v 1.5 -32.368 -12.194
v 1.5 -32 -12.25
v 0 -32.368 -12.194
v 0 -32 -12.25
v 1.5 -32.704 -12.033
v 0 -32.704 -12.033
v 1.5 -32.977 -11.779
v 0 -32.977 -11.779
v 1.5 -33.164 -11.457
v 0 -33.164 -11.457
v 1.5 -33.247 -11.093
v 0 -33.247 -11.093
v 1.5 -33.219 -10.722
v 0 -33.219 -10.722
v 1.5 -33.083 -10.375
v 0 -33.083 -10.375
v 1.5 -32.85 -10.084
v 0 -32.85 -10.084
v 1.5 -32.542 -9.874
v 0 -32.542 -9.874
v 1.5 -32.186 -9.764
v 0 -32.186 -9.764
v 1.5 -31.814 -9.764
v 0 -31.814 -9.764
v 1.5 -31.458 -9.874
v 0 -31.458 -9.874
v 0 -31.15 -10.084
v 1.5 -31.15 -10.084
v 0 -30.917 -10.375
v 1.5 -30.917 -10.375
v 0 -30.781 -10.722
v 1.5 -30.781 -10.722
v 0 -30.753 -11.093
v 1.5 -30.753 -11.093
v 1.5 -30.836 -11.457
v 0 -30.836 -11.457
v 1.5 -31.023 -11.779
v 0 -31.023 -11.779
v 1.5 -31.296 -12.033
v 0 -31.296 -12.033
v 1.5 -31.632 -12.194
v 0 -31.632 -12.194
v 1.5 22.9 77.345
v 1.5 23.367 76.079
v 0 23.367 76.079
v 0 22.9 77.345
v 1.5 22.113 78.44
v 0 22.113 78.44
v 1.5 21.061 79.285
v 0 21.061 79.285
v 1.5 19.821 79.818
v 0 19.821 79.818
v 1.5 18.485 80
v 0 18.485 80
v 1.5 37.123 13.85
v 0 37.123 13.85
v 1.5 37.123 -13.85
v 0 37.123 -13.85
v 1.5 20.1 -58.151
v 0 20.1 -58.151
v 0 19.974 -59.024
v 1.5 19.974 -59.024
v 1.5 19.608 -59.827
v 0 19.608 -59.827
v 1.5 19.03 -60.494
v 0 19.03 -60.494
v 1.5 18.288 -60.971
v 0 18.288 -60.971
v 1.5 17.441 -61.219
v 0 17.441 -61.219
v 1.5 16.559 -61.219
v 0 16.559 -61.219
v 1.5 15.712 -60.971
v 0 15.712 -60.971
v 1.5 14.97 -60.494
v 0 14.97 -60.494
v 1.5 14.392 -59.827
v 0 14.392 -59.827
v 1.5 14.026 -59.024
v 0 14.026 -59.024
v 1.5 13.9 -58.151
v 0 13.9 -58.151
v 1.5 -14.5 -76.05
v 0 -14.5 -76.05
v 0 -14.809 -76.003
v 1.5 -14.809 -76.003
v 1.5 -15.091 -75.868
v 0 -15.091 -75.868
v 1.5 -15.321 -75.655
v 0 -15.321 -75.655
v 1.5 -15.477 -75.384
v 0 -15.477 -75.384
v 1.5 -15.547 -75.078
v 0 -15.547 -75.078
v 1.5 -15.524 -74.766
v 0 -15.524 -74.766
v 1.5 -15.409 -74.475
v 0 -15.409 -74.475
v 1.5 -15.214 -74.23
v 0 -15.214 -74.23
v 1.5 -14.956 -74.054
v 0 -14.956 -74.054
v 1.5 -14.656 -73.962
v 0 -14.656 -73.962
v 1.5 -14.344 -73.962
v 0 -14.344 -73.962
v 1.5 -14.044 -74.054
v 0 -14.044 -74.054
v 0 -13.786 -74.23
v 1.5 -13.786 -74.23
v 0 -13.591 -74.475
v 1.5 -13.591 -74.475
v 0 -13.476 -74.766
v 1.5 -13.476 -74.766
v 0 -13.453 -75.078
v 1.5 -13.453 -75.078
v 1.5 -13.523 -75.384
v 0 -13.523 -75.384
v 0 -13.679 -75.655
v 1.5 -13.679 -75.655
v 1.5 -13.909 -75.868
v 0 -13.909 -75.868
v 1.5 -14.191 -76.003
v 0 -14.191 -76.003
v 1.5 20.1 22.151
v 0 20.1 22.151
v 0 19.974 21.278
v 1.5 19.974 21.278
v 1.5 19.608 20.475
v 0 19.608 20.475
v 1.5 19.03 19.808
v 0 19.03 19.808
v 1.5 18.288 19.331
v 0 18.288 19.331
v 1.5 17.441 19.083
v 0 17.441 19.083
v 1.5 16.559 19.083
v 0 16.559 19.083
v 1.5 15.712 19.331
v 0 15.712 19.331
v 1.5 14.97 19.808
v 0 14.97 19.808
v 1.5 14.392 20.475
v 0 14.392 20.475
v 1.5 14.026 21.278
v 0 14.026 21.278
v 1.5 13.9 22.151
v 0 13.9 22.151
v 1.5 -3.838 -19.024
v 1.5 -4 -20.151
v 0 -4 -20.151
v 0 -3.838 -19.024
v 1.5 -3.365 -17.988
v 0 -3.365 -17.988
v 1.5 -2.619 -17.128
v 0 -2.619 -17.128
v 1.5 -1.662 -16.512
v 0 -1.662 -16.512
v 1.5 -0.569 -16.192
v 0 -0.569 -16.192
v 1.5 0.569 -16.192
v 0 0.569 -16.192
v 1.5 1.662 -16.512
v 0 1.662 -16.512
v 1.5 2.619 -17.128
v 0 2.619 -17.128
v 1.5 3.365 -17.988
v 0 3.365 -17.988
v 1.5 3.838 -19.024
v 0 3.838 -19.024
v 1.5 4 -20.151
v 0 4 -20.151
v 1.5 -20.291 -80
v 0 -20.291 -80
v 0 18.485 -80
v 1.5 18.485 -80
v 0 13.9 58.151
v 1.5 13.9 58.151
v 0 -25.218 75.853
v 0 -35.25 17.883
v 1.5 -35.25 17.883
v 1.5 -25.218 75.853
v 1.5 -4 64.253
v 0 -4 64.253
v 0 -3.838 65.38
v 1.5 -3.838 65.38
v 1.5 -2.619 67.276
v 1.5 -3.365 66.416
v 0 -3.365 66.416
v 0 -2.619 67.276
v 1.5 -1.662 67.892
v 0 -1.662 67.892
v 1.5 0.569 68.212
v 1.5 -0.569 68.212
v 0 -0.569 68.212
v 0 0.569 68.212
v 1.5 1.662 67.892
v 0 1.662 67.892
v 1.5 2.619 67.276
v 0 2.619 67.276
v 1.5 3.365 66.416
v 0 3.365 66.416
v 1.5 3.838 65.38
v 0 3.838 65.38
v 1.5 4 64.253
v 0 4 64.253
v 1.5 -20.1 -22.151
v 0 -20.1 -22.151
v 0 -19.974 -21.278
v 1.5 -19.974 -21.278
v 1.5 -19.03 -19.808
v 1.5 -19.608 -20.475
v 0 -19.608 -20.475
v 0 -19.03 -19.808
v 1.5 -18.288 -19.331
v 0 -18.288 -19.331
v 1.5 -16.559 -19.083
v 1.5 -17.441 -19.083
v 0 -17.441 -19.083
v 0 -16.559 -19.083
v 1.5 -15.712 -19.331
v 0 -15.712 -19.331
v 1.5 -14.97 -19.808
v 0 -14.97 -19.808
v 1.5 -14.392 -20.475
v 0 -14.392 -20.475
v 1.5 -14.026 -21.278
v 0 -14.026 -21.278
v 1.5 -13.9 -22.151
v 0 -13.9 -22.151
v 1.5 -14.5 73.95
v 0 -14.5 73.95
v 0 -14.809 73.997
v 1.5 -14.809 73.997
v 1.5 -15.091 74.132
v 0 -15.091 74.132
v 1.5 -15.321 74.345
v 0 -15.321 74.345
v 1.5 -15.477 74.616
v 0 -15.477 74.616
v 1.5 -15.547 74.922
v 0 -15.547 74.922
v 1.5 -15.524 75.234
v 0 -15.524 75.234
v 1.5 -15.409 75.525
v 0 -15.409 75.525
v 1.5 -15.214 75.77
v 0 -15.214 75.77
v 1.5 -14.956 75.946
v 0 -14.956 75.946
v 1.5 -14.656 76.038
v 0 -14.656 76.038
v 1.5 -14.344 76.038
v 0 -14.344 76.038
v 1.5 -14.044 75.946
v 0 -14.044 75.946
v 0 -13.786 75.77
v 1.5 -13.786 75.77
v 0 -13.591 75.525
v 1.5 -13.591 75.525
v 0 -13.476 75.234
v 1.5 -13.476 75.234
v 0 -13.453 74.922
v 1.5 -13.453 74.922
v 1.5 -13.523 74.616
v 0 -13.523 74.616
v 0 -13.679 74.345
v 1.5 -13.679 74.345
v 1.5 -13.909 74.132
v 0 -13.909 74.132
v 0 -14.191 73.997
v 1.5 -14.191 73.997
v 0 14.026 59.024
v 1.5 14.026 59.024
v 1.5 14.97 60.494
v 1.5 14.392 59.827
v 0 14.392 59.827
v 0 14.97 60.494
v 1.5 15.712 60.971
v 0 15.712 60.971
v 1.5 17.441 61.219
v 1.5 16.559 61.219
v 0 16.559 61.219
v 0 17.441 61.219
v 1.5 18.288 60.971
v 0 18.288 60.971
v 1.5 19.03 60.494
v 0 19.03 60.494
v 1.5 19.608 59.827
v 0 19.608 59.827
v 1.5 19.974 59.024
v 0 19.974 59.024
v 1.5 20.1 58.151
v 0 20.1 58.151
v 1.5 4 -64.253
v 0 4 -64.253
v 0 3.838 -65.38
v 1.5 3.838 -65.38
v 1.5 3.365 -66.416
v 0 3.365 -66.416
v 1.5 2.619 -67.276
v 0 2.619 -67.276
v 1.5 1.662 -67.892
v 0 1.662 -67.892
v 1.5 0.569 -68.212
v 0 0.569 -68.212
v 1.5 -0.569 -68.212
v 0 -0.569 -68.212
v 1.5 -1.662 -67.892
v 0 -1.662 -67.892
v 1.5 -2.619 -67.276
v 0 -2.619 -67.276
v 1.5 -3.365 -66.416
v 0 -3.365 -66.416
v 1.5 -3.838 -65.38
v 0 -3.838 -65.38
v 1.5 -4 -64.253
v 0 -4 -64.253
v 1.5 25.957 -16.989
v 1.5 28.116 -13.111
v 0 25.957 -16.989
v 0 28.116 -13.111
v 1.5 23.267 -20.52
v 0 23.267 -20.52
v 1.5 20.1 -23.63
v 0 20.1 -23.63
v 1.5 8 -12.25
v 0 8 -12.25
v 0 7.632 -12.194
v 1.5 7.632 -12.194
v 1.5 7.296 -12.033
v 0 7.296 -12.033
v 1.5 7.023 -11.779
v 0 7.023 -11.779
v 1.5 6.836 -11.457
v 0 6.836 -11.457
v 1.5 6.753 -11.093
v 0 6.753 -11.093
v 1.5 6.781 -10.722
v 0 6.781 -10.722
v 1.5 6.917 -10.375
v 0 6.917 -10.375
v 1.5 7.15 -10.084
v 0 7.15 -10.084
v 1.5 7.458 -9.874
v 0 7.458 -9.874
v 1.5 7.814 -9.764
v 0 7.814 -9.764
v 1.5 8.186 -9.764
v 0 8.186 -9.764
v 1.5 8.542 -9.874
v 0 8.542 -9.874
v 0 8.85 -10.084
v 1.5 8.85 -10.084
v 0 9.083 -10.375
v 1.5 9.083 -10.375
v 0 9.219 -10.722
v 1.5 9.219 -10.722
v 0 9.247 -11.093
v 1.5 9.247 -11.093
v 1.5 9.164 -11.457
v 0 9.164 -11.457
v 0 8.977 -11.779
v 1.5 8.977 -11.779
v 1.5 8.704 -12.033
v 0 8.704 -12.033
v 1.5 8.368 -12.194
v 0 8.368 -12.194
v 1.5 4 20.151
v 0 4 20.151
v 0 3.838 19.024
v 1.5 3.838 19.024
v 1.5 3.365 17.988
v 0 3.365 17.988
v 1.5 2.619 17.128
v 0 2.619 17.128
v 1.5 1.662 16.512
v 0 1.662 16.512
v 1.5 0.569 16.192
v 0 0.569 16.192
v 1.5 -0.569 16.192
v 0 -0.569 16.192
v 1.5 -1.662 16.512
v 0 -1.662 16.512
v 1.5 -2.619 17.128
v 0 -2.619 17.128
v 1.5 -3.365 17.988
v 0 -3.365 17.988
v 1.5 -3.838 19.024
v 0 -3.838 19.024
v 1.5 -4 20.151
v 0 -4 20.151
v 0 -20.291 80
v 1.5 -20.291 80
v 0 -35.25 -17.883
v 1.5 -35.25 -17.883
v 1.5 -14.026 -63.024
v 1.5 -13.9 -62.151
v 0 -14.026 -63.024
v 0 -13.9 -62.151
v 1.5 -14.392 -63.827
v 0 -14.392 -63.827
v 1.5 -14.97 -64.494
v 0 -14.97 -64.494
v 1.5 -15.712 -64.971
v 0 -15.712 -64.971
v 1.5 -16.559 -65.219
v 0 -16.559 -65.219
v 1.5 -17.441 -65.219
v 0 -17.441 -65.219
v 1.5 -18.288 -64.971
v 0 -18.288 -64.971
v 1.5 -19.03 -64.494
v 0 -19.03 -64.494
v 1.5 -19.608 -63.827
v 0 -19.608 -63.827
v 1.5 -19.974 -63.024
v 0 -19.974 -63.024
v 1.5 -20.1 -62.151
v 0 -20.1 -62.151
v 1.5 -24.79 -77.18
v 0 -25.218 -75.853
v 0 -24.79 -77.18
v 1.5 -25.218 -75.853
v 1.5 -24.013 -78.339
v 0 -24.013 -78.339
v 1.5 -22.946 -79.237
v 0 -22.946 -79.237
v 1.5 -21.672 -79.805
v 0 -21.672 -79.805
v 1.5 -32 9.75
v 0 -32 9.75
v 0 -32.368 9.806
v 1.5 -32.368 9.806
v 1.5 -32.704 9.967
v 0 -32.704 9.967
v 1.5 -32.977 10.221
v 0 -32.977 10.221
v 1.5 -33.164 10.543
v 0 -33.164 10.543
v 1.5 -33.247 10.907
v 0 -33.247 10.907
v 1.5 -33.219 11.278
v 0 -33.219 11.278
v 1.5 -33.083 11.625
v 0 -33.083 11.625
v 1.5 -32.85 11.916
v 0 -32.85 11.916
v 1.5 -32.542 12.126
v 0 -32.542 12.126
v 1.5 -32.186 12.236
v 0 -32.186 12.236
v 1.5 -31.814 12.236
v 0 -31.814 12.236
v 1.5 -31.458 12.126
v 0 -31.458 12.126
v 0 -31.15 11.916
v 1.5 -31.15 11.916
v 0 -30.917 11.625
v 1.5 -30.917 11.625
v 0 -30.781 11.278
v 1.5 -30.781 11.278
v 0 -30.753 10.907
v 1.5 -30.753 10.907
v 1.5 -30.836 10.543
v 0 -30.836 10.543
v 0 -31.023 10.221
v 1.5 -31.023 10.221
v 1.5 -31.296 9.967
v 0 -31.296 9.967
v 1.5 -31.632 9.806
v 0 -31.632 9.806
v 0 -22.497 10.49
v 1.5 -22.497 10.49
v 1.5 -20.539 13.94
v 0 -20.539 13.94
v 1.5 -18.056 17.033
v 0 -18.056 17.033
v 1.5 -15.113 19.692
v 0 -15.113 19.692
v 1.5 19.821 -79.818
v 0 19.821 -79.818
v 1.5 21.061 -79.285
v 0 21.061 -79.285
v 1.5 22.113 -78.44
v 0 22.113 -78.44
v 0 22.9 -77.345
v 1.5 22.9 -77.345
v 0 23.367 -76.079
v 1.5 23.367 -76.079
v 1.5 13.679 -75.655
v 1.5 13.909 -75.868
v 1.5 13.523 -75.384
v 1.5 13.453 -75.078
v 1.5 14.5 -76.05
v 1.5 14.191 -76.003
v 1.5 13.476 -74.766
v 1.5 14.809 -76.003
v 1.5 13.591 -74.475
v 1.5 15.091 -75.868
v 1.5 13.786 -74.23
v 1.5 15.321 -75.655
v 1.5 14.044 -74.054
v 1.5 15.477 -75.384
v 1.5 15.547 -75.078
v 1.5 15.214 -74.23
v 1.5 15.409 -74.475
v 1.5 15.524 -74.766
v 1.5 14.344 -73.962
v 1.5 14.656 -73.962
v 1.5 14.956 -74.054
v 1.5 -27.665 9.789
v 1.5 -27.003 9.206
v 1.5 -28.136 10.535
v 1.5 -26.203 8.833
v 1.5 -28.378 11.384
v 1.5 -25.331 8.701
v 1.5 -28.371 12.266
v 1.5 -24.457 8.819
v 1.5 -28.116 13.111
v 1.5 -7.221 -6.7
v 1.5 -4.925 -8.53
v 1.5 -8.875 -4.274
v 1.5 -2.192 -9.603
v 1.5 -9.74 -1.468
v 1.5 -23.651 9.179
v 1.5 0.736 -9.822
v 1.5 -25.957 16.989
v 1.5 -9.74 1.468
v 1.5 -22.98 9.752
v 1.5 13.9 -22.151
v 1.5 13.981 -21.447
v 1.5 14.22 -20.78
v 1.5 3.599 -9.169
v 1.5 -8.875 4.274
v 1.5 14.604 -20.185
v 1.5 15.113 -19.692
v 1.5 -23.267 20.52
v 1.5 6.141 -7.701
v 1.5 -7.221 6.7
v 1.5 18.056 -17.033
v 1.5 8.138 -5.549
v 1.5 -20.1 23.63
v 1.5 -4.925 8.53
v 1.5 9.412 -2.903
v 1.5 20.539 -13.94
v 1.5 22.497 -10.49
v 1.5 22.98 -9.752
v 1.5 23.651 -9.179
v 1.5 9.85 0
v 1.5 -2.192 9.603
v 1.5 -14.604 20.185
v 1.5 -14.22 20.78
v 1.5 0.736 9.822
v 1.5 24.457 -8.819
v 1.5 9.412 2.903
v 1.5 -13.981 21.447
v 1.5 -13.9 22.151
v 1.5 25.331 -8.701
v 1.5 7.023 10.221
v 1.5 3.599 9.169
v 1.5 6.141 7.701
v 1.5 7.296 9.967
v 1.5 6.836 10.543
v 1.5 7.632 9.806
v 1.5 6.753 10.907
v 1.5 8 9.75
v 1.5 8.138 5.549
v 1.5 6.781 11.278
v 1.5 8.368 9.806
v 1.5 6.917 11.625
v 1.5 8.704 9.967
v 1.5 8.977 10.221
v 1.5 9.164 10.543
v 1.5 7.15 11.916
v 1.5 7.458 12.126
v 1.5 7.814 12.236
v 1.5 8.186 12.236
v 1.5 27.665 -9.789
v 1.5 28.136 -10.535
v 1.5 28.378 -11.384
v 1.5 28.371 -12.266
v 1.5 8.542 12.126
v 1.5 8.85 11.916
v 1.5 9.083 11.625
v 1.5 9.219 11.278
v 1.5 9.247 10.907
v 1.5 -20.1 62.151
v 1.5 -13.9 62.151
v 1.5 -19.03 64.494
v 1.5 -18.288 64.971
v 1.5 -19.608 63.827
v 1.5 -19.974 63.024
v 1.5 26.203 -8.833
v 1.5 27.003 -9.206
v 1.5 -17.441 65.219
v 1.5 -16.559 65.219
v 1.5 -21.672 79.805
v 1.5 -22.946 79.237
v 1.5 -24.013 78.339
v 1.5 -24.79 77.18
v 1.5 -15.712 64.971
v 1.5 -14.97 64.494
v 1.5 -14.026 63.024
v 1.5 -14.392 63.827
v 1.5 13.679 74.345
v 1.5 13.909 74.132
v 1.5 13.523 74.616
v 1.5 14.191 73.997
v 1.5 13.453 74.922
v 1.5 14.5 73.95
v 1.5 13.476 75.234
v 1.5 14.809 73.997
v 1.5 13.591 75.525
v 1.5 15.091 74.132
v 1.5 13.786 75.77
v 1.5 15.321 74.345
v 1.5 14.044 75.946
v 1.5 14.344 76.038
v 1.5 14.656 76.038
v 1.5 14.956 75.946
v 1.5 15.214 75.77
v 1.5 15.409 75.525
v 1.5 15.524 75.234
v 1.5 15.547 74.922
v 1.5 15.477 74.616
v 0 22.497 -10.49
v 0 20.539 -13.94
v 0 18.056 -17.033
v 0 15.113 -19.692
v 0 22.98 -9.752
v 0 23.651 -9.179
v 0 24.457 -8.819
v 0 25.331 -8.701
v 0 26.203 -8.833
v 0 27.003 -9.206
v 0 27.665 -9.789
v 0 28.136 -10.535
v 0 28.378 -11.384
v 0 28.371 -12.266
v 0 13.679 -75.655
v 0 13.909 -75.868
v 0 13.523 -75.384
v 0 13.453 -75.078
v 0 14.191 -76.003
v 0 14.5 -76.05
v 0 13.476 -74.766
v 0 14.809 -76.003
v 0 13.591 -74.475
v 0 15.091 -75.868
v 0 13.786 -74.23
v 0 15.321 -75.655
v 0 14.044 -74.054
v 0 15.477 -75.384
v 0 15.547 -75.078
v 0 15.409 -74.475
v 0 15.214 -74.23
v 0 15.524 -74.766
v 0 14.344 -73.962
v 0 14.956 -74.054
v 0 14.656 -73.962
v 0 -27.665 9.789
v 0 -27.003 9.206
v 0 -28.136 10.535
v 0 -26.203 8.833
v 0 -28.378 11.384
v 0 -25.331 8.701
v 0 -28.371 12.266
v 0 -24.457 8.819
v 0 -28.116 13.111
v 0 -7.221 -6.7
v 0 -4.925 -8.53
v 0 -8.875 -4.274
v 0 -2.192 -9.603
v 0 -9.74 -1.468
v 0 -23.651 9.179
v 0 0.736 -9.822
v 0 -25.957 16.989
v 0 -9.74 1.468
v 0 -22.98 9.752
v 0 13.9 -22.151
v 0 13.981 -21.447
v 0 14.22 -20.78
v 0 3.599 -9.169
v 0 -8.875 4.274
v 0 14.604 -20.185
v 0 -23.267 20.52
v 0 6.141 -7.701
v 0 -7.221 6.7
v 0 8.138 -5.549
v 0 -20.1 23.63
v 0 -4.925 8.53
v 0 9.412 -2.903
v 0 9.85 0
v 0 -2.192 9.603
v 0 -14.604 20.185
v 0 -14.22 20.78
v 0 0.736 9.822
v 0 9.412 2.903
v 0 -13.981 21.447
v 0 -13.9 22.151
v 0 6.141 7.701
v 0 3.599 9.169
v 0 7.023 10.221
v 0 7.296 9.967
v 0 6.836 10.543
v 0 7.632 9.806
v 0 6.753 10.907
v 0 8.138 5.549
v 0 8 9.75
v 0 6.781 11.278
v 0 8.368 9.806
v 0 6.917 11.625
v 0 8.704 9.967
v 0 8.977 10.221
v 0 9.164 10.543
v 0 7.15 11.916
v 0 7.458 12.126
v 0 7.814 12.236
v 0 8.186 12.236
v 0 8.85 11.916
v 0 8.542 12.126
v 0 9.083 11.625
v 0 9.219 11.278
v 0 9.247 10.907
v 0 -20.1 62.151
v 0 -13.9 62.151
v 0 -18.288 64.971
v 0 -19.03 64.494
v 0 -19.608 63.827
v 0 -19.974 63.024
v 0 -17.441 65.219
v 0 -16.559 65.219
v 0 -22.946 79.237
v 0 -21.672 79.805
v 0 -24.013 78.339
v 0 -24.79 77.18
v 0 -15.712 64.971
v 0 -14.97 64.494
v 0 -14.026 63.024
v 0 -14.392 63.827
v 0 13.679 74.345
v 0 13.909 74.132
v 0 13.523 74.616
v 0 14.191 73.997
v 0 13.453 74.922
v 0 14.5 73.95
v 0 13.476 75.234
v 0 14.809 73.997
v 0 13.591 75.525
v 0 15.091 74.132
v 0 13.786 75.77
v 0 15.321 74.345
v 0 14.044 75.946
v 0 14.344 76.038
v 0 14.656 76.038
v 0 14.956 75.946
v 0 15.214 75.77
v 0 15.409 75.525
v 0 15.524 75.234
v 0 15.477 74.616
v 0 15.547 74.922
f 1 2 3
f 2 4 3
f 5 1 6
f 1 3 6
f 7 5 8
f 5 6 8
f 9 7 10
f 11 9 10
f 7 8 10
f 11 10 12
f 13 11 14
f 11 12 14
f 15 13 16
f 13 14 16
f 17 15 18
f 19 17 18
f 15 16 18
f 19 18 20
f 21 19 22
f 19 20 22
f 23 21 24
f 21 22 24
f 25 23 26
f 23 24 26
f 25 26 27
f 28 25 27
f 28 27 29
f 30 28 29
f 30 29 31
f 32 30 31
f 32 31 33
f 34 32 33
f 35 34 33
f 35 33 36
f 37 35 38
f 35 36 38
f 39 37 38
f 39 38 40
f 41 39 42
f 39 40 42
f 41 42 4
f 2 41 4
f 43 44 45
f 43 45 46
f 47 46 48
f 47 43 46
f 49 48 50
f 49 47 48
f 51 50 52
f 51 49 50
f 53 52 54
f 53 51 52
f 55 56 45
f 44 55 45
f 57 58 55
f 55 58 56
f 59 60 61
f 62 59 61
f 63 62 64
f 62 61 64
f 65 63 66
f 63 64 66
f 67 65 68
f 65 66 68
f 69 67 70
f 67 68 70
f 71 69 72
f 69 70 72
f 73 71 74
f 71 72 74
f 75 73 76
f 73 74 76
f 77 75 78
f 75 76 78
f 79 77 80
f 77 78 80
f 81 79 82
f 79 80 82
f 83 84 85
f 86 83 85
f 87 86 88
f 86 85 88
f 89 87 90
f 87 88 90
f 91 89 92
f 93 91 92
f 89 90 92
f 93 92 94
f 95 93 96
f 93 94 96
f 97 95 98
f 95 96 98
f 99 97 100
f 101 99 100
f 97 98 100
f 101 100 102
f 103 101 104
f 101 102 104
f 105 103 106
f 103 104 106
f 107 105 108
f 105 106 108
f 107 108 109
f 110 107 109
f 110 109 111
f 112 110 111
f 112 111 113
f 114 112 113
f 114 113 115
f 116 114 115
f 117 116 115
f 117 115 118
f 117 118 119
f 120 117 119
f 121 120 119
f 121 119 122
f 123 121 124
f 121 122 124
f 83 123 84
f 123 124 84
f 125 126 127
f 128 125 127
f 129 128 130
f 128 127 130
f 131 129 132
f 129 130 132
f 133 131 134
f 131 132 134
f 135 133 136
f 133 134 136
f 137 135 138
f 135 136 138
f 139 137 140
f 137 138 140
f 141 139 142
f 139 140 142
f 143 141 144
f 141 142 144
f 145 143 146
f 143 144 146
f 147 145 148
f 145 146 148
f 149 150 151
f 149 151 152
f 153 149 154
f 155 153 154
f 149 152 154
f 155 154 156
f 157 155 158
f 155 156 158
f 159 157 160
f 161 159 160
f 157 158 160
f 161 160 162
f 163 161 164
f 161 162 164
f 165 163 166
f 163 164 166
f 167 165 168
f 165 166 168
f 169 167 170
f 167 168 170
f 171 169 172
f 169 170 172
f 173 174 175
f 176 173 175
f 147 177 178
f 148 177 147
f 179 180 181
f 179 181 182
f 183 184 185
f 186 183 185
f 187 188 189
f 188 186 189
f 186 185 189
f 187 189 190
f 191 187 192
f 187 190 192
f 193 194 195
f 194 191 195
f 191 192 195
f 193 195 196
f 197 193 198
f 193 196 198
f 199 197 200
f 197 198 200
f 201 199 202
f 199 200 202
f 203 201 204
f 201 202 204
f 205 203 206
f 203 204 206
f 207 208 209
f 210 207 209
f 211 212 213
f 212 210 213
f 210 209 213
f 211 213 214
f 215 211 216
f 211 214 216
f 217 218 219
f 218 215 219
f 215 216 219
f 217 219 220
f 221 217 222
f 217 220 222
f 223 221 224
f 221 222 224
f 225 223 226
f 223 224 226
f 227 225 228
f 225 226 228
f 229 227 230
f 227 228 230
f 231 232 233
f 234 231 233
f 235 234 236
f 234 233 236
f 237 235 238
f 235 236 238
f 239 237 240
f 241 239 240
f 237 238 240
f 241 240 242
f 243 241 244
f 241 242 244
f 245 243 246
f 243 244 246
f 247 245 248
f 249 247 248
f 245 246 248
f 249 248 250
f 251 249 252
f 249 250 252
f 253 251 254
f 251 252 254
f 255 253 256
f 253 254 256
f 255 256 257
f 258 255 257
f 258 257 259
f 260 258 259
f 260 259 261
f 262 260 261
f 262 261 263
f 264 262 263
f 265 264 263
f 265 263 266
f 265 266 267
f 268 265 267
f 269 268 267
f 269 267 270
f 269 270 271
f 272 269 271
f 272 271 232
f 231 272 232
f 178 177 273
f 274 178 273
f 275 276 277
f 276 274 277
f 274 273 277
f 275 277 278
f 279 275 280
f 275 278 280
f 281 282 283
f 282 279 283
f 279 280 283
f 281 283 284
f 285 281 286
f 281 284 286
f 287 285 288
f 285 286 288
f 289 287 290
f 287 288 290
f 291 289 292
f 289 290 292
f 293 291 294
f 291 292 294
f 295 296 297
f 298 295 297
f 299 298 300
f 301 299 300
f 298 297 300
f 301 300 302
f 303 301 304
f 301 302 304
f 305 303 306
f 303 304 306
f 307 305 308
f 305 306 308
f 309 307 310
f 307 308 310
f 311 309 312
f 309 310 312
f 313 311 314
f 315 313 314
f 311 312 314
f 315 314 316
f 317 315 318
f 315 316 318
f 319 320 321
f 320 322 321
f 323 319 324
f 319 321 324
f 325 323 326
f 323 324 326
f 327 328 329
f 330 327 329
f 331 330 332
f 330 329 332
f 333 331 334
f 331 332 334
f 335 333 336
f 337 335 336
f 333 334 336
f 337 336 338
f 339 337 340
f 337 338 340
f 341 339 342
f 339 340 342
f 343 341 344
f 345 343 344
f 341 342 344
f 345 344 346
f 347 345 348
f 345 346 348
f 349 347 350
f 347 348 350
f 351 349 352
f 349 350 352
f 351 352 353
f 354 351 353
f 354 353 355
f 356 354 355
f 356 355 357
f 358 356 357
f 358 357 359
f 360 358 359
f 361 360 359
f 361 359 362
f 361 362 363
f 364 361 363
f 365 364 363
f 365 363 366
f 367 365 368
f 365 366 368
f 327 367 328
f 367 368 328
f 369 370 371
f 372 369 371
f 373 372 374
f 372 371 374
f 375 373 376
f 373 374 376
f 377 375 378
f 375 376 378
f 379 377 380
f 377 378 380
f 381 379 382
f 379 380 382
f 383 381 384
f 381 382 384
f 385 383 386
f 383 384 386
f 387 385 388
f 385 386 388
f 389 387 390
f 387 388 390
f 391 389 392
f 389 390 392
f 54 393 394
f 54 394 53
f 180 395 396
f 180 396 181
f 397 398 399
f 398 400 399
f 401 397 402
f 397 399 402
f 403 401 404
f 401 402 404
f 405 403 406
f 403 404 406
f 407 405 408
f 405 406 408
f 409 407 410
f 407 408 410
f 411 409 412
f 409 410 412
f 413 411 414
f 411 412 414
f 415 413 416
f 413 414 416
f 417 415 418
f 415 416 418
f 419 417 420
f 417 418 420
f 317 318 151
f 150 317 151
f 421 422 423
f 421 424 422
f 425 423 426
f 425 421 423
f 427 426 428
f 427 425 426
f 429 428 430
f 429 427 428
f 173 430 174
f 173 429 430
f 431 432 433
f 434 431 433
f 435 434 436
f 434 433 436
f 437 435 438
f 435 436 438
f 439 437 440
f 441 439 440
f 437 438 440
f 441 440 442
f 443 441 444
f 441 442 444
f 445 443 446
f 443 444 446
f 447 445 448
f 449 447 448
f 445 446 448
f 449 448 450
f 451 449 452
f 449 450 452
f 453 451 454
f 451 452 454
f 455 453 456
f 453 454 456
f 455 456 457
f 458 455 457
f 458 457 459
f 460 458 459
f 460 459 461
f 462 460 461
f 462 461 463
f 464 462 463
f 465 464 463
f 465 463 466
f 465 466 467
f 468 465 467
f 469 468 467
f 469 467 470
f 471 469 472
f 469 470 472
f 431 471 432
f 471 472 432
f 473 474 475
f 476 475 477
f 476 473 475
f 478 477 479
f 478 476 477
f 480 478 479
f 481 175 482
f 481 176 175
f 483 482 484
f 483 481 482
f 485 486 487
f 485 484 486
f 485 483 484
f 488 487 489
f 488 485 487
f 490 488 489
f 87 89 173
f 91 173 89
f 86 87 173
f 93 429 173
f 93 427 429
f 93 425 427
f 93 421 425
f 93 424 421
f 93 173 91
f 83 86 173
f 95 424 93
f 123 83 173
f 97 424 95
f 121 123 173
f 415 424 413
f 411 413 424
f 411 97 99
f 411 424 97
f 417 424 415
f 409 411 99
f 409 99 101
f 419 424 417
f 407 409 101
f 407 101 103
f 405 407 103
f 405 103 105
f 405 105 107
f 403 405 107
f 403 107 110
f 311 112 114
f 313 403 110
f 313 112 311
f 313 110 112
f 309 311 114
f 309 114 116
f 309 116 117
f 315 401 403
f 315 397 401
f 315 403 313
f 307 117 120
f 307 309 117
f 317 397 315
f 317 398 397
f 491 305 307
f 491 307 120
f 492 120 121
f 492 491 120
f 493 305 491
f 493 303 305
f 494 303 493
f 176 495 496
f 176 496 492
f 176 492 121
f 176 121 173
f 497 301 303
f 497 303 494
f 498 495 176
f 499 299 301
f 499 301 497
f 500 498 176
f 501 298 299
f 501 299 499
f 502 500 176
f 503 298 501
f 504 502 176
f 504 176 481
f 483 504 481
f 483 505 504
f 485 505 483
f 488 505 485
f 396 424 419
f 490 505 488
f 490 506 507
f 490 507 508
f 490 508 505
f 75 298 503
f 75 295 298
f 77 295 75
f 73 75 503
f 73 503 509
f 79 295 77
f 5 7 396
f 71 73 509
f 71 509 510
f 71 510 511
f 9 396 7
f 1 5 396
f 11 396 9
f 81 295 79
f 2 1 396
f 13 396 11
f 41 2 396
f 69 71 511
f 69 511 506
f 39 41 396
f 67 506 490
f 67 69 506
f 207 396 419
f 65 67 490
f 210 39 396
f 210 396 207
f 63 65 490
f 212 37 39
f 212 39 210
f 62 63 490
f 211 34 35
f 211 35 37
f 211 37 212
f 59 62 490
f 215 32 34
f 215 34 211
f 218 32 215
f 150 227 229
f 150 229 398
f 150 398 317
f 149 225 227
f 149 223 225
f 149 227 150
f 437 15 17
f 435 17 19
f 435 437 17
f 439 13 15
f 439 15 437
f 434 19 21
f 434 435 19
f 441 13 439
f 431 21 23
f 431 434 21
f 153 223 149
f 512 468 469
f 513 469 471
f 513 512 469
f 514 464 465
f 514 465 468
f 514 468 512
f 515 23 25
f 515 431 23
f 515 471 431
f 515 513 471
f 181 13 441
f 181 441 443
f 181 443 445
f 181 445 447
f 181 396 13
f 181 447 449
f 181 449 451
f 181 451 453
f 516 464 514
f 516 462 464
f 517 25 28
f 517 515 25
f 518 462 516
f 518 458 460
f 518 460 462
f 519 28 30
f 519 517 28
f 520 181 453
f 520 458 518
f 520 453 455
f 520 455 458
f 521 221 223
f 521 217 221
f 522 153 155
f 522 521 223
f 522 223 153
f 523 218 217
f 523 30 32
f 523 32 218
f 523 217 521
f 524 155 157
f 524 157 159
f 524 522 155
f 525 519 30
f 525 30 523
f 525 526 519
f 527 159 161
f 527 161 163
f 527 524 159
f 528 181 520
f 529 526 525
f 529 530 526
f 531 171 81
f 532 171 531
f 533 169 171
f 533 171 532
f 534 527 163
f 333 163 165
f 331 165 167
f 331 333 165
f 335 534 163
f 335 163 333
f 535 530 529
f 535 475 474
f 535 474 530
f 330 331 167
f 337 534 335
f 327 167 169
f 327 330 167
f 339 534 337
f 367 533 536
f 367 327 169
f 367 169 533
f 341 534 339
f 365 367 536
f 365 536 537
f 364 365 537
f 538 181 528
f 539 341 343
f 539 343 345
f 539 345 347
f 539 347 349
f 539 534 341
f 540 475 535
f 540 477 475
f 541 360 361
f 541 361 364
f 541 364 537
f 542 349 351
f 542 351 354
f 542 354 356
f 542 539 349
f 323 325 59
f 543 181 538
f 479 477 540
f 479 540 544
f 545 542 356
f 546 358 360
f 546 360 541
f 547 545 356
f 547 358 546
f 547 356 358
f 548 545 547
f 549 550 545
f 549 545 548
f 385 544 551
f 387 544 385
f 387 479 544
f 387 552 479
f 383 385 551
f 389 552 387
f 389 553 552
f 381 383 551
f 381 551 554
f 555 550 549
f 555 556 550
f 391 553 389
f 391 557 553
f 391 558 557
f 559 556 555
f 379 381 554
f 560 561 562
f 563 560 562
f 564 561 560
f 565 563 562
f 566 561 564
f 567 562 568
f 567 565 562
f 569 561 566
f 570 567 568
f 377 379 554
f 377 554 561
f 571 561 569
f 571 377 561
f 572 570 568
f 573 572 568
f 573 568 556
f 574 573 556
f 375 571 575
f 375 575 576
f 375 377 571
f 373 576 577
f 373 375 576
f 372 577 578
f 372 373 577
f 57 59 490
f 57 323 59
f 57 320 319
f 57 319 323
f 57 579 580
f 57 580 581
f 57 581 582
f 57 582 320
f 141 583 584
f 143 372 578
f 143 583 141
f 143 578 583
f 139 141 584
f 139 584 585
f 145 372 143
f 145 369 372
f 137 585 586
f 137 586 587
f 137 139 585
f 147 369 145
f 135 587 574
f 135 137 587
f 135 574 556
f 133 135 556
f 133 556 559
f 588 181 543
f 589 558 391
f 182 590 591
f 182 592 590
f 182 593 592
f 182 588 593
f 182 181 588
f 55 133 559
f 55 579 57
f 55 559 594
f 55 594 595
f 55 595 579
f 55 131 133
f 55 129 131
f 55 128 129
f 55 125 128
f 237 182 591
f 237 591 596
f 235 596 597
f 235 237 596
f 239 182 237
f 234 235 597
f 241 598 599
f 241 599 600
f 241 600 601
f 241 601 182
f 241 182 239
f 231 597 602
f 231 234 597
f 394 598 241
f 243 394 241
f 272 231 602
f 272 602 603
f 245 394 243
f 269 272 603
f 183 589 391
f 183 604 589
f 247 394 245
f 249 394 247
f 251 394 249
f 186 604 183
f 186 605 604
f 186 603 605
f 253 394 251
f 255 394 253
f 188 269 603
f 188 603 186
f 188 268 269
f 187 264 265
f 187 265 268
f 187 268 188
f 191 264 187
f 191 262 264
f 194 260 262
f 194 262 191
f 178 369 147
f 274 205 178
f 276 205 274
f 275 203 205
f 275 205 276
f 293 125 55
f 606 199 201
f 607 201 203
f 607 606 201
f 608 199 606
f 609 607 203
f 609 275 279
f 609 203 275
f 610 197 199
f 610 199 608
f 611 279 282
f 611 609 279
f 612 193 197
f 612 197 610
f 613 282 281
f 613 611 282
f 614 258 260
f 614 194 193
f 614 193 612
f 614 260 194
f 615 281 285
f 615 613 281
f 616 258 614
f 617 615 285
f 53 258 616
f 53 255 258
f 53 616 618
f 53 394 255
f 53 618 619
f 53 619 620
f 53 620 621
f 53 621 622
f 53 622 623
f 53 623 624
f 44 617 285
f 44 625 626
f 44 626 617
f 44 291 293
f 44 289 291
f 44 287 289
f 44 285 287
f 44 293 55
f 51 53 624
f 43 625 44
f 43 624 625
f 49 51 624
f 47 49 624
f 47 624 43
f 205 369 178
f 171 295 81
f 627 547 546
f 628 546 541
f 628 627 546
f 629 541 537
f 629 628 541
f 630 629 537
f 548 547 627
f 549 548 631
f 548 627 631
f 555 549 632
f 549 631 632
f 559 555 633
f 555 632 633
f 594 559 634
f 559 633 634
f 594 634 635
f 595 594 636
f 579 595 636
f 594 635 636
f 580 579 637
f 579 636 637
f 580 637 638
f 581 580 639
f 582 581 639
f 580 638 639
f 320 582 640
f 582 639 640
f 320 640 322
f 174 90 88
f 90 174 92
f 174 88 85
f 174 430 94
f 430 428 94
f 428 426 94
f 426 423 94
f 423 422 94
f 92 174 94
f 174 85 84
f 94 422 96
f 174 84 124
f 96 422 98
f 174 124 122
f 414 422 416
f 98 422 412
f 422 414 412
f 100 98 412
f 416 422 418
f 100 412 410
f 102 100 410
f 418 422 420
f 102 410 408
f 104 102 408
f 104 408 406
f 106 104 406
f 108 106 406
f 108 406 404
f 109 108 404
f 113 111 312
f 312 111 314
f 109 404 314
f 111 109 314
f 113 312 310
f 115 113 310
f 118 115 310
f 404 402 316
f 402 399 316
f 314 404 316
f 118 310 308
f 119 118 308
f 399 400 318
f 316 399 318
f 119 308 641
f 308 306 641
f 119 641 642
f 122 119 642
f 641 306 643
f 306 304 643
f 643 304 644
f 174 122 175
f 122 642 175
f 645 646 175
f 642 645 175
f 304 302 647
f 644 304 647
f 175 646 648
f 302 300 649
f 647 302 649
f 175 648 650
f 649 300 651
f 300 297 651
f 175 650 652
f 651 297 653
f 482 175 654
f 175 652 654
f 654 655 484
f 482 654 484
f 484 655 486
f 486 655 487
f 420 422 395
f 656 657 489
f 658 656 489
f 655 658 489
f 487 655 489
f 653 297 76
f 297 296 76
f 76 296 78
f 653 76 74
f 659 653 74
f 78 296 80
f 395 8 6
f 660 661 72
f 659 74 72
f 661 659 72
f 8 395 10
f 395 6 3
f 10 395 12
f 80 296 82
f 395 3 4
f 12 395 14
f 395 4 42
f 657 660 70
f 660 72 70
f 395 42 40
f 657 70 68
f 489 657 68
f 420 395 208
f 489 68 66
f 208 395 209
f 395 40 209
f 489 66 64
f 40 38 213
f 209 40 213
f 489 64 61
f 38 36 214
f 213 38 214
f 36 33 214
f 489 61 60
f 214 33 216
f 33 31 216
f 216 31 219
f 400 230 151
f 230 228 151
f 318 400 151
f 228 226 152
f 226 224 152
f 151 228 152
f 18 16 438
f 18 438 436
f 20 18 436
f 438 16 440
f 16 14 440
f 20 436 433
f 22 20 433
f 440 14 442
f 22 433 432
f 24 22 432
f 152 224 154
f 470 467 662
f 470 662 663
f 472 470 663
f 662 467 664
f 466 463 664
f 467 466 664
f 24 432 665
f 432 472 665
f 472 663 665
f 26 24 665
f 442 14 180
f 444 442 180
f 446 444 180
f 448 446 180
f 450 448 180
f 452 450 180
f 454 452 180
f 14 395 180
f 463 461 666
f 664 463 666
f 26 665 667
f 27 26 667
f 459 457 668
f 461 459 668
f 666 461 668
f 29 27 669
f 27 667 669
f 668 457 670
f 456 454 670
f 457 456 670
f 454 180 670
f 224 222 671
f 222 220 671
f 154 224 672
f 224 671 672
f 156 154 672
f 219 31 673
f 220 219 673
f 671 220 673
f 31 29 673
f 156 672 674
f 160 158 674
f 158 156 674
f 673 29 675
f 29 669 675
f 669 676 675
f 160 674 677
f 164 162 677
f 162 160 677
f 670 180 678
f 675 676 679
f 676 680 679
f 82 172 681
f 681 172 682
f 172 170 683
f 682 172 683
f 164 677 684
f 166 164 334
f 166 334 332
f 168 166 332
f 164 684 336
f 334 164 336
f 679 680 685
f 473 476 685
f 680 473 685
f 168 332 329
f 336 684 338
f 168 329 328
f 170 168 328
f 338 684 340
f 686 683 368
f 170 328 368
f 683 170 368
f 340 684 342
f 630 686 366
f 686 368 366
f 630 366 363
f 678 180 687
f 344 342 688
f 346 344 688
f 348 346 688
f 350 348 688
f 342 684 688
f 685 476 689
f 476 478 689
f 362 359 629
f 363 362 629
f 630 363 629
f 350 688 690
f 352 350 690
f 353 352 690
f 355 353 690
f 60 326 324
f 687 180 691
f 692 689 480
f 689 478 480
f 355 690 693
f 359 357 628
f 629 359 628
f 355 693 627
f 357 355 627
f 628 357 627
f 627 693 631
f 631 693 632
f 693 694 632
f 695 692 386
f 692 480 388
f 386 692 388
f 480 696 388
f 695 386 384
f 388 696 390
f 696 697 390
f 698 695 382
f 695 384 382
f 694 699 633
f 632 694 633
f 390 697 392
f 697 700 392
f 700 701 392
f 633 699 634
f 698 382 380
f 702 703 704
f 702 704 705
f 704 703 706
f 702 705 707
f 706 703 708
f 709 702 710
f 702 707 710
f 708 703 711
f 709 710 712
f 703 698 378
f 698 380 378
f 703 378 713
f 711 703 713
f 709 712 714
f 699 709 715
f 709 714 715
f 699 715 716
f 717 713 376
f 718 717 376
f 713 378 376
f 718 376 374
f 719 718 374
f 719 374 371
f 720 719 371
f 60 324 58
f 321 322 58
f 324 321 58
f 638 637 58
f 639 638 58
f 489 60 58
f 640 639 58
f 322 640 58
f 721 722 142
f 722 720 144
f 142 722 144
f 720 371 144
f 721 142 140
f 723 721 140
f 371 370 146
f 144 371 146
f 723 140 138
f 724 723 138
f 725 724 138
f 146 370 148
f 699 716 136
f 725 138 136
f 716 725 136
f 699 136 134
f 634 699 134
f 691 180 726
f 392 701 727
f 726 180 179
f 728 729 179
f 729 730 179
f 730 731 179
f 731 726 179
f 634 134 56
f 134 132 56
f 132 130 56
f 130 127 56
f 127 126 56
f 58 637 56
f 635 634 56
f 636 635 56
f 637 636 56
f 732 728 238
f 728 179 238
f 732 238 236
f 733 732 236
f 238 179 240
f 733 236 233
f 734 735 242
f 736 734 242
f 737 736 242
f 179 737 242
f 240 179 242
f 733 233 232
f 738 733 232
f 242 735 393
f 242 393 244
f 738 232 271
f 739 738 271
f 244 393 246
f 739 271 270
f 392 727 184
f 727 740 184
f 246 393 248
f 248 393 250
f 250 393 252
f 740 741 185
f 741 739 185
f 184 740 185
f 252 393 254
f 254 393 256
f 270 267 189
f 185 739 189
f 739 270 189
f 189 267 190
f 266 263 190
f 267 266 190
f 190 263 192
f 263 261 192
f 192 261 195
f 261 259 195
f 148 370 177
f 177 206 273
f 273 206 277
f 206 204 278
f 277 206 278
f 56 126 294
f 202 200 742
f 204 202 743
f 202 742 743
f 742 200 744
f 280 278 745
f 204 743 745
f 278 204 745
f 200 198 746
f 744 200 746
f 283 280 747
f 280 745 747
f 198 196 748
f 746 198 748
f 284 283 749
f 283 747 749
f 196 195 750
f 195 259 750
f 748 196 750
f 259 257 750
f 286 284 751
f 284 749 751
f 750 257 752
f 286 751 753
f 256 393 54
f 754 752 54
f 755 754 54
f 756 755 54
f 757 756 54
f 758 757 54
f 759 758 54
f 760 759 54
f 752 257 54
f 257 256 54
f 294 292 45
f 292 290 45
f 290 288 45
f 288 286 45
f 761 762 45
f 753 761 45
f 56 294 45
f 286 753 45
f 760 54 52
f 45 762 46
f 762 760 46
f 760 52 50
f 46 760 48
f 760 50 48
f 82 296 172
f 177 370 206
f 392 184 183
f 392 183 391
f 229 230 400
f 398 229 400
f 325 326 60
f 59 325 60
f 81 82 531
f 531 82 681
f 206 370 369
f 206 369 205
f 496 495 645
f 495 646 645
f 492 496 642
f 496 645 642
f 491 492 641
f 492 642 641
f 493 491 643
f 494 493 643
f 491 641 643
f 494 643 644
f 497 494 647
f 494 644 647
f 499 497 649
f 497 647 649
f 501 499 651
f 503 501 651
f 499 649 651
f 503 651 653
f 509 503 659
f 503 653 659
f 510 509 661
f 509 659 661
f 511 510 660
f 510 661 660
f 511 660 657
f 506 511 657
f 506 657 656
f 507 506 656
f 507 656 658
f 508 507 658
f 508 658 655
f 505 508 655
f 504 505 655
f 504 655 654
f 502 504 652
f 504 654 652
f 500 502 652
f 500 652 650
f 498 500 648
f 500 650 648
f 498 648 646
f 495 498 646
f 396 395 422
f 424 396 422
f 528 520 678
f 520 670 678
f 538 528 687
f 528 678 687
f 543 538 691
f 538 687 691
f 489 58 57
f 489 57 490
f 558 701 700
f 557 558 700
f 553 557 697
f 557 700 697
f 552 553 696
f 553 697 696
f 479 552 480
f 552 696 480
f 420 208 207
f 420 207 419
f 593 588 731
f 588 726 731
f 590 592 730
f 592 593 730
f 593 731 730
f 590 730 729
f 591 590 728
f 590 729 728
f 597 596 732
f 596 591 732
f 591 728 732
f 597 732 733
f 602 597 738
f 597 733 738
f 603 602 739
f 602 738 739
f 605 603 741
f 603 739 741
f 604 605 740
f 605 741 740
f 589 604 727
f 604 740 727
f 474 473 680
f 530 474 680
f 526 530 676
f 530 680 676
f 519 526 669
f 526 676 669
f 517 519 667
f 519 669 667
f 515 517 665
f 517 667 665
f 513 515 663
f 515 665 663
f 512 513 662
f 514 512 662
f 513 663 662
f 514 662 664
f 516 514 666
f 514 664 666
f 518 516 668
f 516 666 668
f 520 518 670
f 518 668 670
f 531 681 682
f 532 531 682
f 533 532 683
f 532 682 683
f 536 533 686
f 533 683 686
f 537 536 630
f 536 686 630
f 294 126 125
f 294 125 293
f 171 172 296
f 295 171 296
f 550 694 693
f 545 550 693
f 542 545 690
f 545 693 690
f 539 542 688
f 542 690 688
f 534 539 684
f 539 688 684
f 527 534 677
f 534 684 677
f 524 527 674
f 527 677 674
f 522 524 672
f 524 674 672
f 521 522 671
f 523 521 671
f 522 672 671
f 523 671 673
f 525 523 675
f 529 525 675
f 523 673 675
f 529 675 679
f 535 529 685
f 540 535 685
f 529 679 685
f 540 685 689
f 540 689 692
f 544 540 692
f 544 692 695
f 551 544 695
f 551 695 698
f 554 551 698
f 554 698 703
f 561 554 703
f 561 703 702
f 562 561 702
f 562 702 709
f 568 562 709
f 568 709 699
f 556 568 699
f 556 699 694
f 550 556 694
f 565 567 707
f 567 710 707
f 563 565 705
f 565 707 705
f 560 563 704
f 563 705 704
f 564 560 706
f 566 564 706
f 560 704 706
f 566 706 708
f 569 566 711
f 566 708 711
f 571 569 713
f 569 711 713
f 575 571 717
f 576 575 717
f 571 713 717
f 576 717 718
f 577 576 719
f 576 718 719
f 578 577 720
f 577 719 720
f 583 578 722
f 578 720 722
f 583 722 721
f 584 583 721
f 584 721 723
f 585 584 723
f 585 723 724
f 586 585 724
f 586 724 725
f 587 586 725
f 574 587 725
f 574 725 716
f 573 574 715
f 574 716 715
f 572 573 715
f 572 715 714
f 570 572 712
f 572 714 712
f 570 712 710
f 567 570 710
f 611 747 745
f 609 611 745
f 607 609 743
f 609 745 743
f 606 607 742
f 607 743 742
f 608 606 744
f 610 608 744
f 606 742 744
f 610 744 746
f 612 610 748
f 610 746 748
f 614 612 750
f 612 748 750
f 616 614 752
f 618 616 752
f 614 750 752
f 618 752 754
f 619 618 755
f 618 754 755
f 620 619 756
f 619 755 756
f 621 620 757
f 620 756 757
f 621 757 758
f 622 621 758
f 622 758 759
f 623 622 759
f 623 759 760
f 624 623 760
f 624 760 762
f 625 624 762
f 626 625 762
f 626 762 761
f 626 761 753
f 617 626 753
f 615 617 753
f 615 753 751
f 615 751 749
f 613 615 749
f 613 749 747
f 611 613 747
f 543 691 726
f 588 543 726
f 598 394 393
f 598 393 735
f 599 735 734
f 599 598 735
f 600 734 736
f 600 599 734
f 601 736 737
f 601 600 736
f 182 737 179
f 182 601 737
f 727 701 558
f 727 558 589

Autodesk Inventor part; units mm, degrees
ref_plane "YZ Plane" through (0, 0, 0) normal (1, 0, 0) x (0, 1, 0)
ref_plane "XZ Plane" through (0, 0, 0) normal (0, 1, 0) x (-1, 0, 0)
ref_plane "XY Plane" through (0, 0, 0) normal (0, 0, 1) x (1, 0, 0)
sketch "スケッチ1" plane through (0, 0, 0) normal (1, 0, 0) x (0, 1, 0)
  line L0 (37.123, 0) -> (-35.25, 0)
  line L1 (-35.25, 0) -> (-35.25, -80)
  line L2 (-35.25, -80) -> (37.123, -80)
  line L3 (37.123, -80) -> (37.123, 0)
  line L4 (-35.25, 0) -> (-35.25, -17.883)
  line L5 (37.123, 0) -> (37.123, -13.85)
  line L6 (37.123, -13.85) -> (22.5, -80)
  line L7 (-35.25, -17.883) -> (-24.5, -80)
  circle A0 centre (0, 0) radius 9.85
  line L8 (0, 0) -> (0, -80)
  line L9 (14.5, -80) -> (0, -80)
  line L10 (0, -80) -> (0, -75)
  line L11 (0, -75) -> (14.5, -75)
  line L12 (14.5, -75) -> (14.5, -80)
  line L13 (0, -75) -> (-14.5, -75)
  line L14 (-14.5, -75) -> (-14.5, -80)
  circle A1 centre (0, -20.151) radius 4
  circle A2 centre (0, -64.253) radius 4
  line L15 (4, -20.151) -> (4, -64.253)
  line L16 (-4, -64.253) -> (-4, -20.151)
  line L17 (11.25, 0) -> (-35.25, 0)
  line L18 (-35.25, 0) -> (-35.25, -14.25)
  line L19 (-35.25, -14.25) -> (11.25, -14.25)
  line L20 (11.25, -14.25) -> (11.25, 0)
  circle A3 centre (17, -22.151) radius 3.1
  line L21 (17, -22.151) -> (17, -58.151)
  circle A4 centre (17, -58.151) radius 3.1
  line L22 (20.1, -22.151) -> (20.1, -58.151)
  line L23 (13.9, -58.151) -> (13.9, -22.151)
  circle A5 centre (-17, -22.151) radius 3.1
  line L24 (-17, -22.151) -> (-17, -62.151)
  circle A6 centre (-17, -62.151) radius 3.1
  line L25 (-13.9, -22.151) -> (-13.9, -62.151)
  line L26 (-20.1, -22.151) -> (-20.1, -62.151)
  line L27 (-35.25, 0) -> (-35.25, 80)
  line L28 (-35.25, 80) -> (37.123, 80)
  line L29 (37.123, 80) -> (37.123, 0)
  line L30 (-35.25, 0) -> (-35.25, 17.883)
  line L31 (37.123, 0) -> (37.123, 13.85)
  line L32 (37.123, 13.85) -> (22.5, 80)
  line L33 (-35.25, 17.883) -> (-24.5, 80)
  circle A7 centre (0, 20.151) radius 4
  circle A8 centre (0, 64.253) radius 4
  line L34 (4, 20.151) -> (4, 64.253)
  line L35 (-4, 64.253) -> (-4, 20.151)
  circle A9 centre (17, 22.151) radius 3.1
  line L36 (17, 22.151) -> (17, 58.151)
  circle A10 centre (17, 58.151) radius 3.1
  line L37 (20.1, 22.151) -> (20.1, 58.151)
  line L38 (13.9, 58.151) -> (13.9, 22.151)
  circle A11 centre (-17, 22.151) radius 3.1
  circle A12 centre (-17, 62.151) radius 3.1
  line L39 (-13.9, 22.151) -> (-13.9, 62.151)
  line L40 (-20.1, 22.151) -> (-20.1, 62.151)
  dimension "d0" = 72.373
  dimension "d1" = 37.123
  dimension "d2" = 80
  dimension "d3" = 17.883
  dimension "d4" = 13.85
  dimension "d7" = 19.7
  dimension "d8" = 14.5
  dimension "d9" = 5
  dimension "d10" = 8
  dimension "d11" = 10
  dimension "d12" = 8
  dimension "d13" = 20.151
  dimension "d14" = 8
  dimension "d15" = 15.747
  dimension "d16" = 11.25
  dimension "d17" = 14.25
  dimension "d18" = 6.2
  dimension "d19" = 17
  dimension "d20" = 22.151
  dimension "d21" = 36
  dimension "d22" = 6.2
  dimension "d23" = 6.2
  dimension "d24" = 22.151
  dimension "d25" = 17
  dimension "d26" = 40
  dimension "d27" = 6.2
extrude "押し出し1" add sketch "スケッチ1" along normal blind 1.5 contours L3 L6 L2 L12 L11 L8 A2 L15 A1 L19 L20 L0 | L0 A0 L27 L33 L28 L32 L29 | L20 L19 L8 A0 L0 | A0 L8 L19 L1 L0 | L8 A1 L16 A2 L13 L14 L2 L7 L1 L19 | L2 L8 L11 L12 | L2 L14 L13 L8
sketch "スケッチ2" plane through (1.5, 0, 0) normal (1, 0, 0) x (0, 0, -1)
  line L0 (-17.883, -35.25) -> (17.883, -35.25) projected
  line L1 (0, 11.25) -> (14.25, 11.25)
  line L2 (14.25, 11.25) -> (14.25, -35.25)
  line L3 (14.25, -35.25) -> (0, -35.25)
  line L4 (0, -35.25) -> (0, 11.25)
  circle A0 centre (0, 0) radius 9.85 projected
  point P0 (11, 8)
  point P1 (11, -32)
  point P2 (-11, 8)
  point P3 (-11, -32)
  dimension "d30" = 14.25
  dimension "d31" = 11.25
  dimension "d32" = 3.25
  dimension "d33" = 3.25
  dimension "d34" = 3.25
  dimension "d35" = 3.25
hole "穴1" at (1.5, 8, -11) at (1.5, -32, -11) at (1.5, 8, 11) at (1.5, -32, 11) direction (-1, 0, 0) diameter 2.5 end through all
sketch "スケッチ3" plane through (1.5, 0, 0) normal (1, 0, 0) x (0, 0, -1)
  line L0 (0, 0) -> (80, 0)
  line L1 (80, -24.5) -> (80, 22.5) projected
  line L2 (13.85, 37.123) -> (-13.85, 37.123) projected
  line L3 (0, 37.123) -> (0, -35.25)
  line L4 (-17.883, -35.25) -> (17.883, -35.25) projected
  point P0 (75, 14.5)
  point P1 (75, -14.5)
  point P2 (-75, 14.5)
  point P3 (-75, -14.5)
  dimension "d43" = 5
  dimension "d44" = 14.5
hole "穴2" at (1.5, 14.5, -75) at (1.5, -14.5, -75) at (1.5, 14.5, 75) at (1.5, -14.5, 75) direction (-1, 0, 0) diameter 2.1 end through all
fillet "フィレット1" radius 5 4 edges at (0.75, 22.5, -80) (0.75, -24.5, -80) (0.75, 22.5, 80) (0.75, -24.5, 80)
sketch "スケッチ4" plane through (0, 0, 0) normal (-1, 0, 0) x (0, 0, 1)
  circle A0 centre (0, 0) radius 27.5
  arc A1 (-22.151, 13.9) -> (-22.151, 20.1) centre (-22.151, 17) ccw projected
  circle A2 centre (-22.151, 17) radius 3.1
  arc A3 (22.151, -13.9) -> (22.151, -20.1) centre (22.151, -17) ccw projected
  circle A4 centre (22.151, -17) radius 3.1
  arc A5 (-22.151, -20.1) -> (-22.151, -13.9) centre (-22.151, -17) ccw projected
  circle A6 centre (-22.151, -17) radius 3.1
  arc A7 (22.151, 20.1) -> (22.151, 13.9) centre (22.151, 17) ccw projected
  circle A8 centre (22.151, 17) radius 3.1
  circle A9 centre (0, 0) radius 24.8225
  circle A10 centre (0, 0) radius 31.0225
  line L0 (0, 0) -> (8.0292, 29.9654)
  line L1 (0, 0) -> (0, 31.0225)
  line L2 (0, 0) -> (-8.0292, -29.9654)
  circle A11 centre (7.2269, 26.9711) radius 3.1
  circle A12 centre (-7.2269, -26.9711) radius 3.1
  line L3 (0, 0) -> (13.1107, -28.1159)
  circle A13 centre (11.8006, -25.3064) radius 3.1
  line L4 (0, 0) -> (-13.1107, 28.1159)
  circle A14 centre (-11.8006, 25.3064) radius 3.1
  point P0 (19.6918, -15.1126)
  point P1 (-19.6918, -15.1126)
  point P2 (-24.6102, -18.8874)
  point P3 (24.6102, -18.8874)
  point P4 (24.6102, 18.8874)
  point P5 (-24.6102, 18.8874)
  point P6 (-22.151, 20.1)
  point P7 (-19.6918, 15.1126)
  point P8 (19.6918, 15.1126)
  point P9 (22.151, 20.1)
  point P10 (-8.0292, -29.9654)
  point P11 (-6.4245, -23.9767)
  point P12 (8.0292, 29.9654)
  point P13 (6.4245, 23.9767)
  point P14 (10.4904, -22.4968)
  point P15 (-10.4904, 22.4968)
  dimension "d53" = 55
  dimension "d56" = 15
  dimension "d57" = 25
extrude "押し出し2" cut sketch "スケッチ4" against normal blind 10 contours A4 A3 A0 | A0 A3 A4 | A3 A4 A10 A13 A0 | A0 A13 A9 A3 | A13 L3 A0 | A0 L3 A13 | L3 A13 A0 | A0 A13 L3 | A14 A0 L4 | A9 A1 A0 A14 | L4 A0 A14 | A14 A0 A1 A2 A10 | A14 A0 L4 | L4 A0 A14 | A1 A2 A0 | A2 A1 A0
equation "\"BendRadius\" = Thickness"
equation "\"BendReliefWidth\" = Thickness"
equation "\"BendReliefDepth\" = 0.5 * Thickness"
equation "\"CornerReliefSize\" = 4 * Thickness"
equation "\"MinimumRemnant\" = 2 * Thickness"
equation "\"TransitionRadius\" = BendRadius"
equation "\"JacobiRadiusSize\" = BendRadius"
equation "\"GapSize\" = Thickness"
equation "\"Thickness\" = 3.048"
properties part number "joint_adaptor_plate" material "アルミニウム 6061"
